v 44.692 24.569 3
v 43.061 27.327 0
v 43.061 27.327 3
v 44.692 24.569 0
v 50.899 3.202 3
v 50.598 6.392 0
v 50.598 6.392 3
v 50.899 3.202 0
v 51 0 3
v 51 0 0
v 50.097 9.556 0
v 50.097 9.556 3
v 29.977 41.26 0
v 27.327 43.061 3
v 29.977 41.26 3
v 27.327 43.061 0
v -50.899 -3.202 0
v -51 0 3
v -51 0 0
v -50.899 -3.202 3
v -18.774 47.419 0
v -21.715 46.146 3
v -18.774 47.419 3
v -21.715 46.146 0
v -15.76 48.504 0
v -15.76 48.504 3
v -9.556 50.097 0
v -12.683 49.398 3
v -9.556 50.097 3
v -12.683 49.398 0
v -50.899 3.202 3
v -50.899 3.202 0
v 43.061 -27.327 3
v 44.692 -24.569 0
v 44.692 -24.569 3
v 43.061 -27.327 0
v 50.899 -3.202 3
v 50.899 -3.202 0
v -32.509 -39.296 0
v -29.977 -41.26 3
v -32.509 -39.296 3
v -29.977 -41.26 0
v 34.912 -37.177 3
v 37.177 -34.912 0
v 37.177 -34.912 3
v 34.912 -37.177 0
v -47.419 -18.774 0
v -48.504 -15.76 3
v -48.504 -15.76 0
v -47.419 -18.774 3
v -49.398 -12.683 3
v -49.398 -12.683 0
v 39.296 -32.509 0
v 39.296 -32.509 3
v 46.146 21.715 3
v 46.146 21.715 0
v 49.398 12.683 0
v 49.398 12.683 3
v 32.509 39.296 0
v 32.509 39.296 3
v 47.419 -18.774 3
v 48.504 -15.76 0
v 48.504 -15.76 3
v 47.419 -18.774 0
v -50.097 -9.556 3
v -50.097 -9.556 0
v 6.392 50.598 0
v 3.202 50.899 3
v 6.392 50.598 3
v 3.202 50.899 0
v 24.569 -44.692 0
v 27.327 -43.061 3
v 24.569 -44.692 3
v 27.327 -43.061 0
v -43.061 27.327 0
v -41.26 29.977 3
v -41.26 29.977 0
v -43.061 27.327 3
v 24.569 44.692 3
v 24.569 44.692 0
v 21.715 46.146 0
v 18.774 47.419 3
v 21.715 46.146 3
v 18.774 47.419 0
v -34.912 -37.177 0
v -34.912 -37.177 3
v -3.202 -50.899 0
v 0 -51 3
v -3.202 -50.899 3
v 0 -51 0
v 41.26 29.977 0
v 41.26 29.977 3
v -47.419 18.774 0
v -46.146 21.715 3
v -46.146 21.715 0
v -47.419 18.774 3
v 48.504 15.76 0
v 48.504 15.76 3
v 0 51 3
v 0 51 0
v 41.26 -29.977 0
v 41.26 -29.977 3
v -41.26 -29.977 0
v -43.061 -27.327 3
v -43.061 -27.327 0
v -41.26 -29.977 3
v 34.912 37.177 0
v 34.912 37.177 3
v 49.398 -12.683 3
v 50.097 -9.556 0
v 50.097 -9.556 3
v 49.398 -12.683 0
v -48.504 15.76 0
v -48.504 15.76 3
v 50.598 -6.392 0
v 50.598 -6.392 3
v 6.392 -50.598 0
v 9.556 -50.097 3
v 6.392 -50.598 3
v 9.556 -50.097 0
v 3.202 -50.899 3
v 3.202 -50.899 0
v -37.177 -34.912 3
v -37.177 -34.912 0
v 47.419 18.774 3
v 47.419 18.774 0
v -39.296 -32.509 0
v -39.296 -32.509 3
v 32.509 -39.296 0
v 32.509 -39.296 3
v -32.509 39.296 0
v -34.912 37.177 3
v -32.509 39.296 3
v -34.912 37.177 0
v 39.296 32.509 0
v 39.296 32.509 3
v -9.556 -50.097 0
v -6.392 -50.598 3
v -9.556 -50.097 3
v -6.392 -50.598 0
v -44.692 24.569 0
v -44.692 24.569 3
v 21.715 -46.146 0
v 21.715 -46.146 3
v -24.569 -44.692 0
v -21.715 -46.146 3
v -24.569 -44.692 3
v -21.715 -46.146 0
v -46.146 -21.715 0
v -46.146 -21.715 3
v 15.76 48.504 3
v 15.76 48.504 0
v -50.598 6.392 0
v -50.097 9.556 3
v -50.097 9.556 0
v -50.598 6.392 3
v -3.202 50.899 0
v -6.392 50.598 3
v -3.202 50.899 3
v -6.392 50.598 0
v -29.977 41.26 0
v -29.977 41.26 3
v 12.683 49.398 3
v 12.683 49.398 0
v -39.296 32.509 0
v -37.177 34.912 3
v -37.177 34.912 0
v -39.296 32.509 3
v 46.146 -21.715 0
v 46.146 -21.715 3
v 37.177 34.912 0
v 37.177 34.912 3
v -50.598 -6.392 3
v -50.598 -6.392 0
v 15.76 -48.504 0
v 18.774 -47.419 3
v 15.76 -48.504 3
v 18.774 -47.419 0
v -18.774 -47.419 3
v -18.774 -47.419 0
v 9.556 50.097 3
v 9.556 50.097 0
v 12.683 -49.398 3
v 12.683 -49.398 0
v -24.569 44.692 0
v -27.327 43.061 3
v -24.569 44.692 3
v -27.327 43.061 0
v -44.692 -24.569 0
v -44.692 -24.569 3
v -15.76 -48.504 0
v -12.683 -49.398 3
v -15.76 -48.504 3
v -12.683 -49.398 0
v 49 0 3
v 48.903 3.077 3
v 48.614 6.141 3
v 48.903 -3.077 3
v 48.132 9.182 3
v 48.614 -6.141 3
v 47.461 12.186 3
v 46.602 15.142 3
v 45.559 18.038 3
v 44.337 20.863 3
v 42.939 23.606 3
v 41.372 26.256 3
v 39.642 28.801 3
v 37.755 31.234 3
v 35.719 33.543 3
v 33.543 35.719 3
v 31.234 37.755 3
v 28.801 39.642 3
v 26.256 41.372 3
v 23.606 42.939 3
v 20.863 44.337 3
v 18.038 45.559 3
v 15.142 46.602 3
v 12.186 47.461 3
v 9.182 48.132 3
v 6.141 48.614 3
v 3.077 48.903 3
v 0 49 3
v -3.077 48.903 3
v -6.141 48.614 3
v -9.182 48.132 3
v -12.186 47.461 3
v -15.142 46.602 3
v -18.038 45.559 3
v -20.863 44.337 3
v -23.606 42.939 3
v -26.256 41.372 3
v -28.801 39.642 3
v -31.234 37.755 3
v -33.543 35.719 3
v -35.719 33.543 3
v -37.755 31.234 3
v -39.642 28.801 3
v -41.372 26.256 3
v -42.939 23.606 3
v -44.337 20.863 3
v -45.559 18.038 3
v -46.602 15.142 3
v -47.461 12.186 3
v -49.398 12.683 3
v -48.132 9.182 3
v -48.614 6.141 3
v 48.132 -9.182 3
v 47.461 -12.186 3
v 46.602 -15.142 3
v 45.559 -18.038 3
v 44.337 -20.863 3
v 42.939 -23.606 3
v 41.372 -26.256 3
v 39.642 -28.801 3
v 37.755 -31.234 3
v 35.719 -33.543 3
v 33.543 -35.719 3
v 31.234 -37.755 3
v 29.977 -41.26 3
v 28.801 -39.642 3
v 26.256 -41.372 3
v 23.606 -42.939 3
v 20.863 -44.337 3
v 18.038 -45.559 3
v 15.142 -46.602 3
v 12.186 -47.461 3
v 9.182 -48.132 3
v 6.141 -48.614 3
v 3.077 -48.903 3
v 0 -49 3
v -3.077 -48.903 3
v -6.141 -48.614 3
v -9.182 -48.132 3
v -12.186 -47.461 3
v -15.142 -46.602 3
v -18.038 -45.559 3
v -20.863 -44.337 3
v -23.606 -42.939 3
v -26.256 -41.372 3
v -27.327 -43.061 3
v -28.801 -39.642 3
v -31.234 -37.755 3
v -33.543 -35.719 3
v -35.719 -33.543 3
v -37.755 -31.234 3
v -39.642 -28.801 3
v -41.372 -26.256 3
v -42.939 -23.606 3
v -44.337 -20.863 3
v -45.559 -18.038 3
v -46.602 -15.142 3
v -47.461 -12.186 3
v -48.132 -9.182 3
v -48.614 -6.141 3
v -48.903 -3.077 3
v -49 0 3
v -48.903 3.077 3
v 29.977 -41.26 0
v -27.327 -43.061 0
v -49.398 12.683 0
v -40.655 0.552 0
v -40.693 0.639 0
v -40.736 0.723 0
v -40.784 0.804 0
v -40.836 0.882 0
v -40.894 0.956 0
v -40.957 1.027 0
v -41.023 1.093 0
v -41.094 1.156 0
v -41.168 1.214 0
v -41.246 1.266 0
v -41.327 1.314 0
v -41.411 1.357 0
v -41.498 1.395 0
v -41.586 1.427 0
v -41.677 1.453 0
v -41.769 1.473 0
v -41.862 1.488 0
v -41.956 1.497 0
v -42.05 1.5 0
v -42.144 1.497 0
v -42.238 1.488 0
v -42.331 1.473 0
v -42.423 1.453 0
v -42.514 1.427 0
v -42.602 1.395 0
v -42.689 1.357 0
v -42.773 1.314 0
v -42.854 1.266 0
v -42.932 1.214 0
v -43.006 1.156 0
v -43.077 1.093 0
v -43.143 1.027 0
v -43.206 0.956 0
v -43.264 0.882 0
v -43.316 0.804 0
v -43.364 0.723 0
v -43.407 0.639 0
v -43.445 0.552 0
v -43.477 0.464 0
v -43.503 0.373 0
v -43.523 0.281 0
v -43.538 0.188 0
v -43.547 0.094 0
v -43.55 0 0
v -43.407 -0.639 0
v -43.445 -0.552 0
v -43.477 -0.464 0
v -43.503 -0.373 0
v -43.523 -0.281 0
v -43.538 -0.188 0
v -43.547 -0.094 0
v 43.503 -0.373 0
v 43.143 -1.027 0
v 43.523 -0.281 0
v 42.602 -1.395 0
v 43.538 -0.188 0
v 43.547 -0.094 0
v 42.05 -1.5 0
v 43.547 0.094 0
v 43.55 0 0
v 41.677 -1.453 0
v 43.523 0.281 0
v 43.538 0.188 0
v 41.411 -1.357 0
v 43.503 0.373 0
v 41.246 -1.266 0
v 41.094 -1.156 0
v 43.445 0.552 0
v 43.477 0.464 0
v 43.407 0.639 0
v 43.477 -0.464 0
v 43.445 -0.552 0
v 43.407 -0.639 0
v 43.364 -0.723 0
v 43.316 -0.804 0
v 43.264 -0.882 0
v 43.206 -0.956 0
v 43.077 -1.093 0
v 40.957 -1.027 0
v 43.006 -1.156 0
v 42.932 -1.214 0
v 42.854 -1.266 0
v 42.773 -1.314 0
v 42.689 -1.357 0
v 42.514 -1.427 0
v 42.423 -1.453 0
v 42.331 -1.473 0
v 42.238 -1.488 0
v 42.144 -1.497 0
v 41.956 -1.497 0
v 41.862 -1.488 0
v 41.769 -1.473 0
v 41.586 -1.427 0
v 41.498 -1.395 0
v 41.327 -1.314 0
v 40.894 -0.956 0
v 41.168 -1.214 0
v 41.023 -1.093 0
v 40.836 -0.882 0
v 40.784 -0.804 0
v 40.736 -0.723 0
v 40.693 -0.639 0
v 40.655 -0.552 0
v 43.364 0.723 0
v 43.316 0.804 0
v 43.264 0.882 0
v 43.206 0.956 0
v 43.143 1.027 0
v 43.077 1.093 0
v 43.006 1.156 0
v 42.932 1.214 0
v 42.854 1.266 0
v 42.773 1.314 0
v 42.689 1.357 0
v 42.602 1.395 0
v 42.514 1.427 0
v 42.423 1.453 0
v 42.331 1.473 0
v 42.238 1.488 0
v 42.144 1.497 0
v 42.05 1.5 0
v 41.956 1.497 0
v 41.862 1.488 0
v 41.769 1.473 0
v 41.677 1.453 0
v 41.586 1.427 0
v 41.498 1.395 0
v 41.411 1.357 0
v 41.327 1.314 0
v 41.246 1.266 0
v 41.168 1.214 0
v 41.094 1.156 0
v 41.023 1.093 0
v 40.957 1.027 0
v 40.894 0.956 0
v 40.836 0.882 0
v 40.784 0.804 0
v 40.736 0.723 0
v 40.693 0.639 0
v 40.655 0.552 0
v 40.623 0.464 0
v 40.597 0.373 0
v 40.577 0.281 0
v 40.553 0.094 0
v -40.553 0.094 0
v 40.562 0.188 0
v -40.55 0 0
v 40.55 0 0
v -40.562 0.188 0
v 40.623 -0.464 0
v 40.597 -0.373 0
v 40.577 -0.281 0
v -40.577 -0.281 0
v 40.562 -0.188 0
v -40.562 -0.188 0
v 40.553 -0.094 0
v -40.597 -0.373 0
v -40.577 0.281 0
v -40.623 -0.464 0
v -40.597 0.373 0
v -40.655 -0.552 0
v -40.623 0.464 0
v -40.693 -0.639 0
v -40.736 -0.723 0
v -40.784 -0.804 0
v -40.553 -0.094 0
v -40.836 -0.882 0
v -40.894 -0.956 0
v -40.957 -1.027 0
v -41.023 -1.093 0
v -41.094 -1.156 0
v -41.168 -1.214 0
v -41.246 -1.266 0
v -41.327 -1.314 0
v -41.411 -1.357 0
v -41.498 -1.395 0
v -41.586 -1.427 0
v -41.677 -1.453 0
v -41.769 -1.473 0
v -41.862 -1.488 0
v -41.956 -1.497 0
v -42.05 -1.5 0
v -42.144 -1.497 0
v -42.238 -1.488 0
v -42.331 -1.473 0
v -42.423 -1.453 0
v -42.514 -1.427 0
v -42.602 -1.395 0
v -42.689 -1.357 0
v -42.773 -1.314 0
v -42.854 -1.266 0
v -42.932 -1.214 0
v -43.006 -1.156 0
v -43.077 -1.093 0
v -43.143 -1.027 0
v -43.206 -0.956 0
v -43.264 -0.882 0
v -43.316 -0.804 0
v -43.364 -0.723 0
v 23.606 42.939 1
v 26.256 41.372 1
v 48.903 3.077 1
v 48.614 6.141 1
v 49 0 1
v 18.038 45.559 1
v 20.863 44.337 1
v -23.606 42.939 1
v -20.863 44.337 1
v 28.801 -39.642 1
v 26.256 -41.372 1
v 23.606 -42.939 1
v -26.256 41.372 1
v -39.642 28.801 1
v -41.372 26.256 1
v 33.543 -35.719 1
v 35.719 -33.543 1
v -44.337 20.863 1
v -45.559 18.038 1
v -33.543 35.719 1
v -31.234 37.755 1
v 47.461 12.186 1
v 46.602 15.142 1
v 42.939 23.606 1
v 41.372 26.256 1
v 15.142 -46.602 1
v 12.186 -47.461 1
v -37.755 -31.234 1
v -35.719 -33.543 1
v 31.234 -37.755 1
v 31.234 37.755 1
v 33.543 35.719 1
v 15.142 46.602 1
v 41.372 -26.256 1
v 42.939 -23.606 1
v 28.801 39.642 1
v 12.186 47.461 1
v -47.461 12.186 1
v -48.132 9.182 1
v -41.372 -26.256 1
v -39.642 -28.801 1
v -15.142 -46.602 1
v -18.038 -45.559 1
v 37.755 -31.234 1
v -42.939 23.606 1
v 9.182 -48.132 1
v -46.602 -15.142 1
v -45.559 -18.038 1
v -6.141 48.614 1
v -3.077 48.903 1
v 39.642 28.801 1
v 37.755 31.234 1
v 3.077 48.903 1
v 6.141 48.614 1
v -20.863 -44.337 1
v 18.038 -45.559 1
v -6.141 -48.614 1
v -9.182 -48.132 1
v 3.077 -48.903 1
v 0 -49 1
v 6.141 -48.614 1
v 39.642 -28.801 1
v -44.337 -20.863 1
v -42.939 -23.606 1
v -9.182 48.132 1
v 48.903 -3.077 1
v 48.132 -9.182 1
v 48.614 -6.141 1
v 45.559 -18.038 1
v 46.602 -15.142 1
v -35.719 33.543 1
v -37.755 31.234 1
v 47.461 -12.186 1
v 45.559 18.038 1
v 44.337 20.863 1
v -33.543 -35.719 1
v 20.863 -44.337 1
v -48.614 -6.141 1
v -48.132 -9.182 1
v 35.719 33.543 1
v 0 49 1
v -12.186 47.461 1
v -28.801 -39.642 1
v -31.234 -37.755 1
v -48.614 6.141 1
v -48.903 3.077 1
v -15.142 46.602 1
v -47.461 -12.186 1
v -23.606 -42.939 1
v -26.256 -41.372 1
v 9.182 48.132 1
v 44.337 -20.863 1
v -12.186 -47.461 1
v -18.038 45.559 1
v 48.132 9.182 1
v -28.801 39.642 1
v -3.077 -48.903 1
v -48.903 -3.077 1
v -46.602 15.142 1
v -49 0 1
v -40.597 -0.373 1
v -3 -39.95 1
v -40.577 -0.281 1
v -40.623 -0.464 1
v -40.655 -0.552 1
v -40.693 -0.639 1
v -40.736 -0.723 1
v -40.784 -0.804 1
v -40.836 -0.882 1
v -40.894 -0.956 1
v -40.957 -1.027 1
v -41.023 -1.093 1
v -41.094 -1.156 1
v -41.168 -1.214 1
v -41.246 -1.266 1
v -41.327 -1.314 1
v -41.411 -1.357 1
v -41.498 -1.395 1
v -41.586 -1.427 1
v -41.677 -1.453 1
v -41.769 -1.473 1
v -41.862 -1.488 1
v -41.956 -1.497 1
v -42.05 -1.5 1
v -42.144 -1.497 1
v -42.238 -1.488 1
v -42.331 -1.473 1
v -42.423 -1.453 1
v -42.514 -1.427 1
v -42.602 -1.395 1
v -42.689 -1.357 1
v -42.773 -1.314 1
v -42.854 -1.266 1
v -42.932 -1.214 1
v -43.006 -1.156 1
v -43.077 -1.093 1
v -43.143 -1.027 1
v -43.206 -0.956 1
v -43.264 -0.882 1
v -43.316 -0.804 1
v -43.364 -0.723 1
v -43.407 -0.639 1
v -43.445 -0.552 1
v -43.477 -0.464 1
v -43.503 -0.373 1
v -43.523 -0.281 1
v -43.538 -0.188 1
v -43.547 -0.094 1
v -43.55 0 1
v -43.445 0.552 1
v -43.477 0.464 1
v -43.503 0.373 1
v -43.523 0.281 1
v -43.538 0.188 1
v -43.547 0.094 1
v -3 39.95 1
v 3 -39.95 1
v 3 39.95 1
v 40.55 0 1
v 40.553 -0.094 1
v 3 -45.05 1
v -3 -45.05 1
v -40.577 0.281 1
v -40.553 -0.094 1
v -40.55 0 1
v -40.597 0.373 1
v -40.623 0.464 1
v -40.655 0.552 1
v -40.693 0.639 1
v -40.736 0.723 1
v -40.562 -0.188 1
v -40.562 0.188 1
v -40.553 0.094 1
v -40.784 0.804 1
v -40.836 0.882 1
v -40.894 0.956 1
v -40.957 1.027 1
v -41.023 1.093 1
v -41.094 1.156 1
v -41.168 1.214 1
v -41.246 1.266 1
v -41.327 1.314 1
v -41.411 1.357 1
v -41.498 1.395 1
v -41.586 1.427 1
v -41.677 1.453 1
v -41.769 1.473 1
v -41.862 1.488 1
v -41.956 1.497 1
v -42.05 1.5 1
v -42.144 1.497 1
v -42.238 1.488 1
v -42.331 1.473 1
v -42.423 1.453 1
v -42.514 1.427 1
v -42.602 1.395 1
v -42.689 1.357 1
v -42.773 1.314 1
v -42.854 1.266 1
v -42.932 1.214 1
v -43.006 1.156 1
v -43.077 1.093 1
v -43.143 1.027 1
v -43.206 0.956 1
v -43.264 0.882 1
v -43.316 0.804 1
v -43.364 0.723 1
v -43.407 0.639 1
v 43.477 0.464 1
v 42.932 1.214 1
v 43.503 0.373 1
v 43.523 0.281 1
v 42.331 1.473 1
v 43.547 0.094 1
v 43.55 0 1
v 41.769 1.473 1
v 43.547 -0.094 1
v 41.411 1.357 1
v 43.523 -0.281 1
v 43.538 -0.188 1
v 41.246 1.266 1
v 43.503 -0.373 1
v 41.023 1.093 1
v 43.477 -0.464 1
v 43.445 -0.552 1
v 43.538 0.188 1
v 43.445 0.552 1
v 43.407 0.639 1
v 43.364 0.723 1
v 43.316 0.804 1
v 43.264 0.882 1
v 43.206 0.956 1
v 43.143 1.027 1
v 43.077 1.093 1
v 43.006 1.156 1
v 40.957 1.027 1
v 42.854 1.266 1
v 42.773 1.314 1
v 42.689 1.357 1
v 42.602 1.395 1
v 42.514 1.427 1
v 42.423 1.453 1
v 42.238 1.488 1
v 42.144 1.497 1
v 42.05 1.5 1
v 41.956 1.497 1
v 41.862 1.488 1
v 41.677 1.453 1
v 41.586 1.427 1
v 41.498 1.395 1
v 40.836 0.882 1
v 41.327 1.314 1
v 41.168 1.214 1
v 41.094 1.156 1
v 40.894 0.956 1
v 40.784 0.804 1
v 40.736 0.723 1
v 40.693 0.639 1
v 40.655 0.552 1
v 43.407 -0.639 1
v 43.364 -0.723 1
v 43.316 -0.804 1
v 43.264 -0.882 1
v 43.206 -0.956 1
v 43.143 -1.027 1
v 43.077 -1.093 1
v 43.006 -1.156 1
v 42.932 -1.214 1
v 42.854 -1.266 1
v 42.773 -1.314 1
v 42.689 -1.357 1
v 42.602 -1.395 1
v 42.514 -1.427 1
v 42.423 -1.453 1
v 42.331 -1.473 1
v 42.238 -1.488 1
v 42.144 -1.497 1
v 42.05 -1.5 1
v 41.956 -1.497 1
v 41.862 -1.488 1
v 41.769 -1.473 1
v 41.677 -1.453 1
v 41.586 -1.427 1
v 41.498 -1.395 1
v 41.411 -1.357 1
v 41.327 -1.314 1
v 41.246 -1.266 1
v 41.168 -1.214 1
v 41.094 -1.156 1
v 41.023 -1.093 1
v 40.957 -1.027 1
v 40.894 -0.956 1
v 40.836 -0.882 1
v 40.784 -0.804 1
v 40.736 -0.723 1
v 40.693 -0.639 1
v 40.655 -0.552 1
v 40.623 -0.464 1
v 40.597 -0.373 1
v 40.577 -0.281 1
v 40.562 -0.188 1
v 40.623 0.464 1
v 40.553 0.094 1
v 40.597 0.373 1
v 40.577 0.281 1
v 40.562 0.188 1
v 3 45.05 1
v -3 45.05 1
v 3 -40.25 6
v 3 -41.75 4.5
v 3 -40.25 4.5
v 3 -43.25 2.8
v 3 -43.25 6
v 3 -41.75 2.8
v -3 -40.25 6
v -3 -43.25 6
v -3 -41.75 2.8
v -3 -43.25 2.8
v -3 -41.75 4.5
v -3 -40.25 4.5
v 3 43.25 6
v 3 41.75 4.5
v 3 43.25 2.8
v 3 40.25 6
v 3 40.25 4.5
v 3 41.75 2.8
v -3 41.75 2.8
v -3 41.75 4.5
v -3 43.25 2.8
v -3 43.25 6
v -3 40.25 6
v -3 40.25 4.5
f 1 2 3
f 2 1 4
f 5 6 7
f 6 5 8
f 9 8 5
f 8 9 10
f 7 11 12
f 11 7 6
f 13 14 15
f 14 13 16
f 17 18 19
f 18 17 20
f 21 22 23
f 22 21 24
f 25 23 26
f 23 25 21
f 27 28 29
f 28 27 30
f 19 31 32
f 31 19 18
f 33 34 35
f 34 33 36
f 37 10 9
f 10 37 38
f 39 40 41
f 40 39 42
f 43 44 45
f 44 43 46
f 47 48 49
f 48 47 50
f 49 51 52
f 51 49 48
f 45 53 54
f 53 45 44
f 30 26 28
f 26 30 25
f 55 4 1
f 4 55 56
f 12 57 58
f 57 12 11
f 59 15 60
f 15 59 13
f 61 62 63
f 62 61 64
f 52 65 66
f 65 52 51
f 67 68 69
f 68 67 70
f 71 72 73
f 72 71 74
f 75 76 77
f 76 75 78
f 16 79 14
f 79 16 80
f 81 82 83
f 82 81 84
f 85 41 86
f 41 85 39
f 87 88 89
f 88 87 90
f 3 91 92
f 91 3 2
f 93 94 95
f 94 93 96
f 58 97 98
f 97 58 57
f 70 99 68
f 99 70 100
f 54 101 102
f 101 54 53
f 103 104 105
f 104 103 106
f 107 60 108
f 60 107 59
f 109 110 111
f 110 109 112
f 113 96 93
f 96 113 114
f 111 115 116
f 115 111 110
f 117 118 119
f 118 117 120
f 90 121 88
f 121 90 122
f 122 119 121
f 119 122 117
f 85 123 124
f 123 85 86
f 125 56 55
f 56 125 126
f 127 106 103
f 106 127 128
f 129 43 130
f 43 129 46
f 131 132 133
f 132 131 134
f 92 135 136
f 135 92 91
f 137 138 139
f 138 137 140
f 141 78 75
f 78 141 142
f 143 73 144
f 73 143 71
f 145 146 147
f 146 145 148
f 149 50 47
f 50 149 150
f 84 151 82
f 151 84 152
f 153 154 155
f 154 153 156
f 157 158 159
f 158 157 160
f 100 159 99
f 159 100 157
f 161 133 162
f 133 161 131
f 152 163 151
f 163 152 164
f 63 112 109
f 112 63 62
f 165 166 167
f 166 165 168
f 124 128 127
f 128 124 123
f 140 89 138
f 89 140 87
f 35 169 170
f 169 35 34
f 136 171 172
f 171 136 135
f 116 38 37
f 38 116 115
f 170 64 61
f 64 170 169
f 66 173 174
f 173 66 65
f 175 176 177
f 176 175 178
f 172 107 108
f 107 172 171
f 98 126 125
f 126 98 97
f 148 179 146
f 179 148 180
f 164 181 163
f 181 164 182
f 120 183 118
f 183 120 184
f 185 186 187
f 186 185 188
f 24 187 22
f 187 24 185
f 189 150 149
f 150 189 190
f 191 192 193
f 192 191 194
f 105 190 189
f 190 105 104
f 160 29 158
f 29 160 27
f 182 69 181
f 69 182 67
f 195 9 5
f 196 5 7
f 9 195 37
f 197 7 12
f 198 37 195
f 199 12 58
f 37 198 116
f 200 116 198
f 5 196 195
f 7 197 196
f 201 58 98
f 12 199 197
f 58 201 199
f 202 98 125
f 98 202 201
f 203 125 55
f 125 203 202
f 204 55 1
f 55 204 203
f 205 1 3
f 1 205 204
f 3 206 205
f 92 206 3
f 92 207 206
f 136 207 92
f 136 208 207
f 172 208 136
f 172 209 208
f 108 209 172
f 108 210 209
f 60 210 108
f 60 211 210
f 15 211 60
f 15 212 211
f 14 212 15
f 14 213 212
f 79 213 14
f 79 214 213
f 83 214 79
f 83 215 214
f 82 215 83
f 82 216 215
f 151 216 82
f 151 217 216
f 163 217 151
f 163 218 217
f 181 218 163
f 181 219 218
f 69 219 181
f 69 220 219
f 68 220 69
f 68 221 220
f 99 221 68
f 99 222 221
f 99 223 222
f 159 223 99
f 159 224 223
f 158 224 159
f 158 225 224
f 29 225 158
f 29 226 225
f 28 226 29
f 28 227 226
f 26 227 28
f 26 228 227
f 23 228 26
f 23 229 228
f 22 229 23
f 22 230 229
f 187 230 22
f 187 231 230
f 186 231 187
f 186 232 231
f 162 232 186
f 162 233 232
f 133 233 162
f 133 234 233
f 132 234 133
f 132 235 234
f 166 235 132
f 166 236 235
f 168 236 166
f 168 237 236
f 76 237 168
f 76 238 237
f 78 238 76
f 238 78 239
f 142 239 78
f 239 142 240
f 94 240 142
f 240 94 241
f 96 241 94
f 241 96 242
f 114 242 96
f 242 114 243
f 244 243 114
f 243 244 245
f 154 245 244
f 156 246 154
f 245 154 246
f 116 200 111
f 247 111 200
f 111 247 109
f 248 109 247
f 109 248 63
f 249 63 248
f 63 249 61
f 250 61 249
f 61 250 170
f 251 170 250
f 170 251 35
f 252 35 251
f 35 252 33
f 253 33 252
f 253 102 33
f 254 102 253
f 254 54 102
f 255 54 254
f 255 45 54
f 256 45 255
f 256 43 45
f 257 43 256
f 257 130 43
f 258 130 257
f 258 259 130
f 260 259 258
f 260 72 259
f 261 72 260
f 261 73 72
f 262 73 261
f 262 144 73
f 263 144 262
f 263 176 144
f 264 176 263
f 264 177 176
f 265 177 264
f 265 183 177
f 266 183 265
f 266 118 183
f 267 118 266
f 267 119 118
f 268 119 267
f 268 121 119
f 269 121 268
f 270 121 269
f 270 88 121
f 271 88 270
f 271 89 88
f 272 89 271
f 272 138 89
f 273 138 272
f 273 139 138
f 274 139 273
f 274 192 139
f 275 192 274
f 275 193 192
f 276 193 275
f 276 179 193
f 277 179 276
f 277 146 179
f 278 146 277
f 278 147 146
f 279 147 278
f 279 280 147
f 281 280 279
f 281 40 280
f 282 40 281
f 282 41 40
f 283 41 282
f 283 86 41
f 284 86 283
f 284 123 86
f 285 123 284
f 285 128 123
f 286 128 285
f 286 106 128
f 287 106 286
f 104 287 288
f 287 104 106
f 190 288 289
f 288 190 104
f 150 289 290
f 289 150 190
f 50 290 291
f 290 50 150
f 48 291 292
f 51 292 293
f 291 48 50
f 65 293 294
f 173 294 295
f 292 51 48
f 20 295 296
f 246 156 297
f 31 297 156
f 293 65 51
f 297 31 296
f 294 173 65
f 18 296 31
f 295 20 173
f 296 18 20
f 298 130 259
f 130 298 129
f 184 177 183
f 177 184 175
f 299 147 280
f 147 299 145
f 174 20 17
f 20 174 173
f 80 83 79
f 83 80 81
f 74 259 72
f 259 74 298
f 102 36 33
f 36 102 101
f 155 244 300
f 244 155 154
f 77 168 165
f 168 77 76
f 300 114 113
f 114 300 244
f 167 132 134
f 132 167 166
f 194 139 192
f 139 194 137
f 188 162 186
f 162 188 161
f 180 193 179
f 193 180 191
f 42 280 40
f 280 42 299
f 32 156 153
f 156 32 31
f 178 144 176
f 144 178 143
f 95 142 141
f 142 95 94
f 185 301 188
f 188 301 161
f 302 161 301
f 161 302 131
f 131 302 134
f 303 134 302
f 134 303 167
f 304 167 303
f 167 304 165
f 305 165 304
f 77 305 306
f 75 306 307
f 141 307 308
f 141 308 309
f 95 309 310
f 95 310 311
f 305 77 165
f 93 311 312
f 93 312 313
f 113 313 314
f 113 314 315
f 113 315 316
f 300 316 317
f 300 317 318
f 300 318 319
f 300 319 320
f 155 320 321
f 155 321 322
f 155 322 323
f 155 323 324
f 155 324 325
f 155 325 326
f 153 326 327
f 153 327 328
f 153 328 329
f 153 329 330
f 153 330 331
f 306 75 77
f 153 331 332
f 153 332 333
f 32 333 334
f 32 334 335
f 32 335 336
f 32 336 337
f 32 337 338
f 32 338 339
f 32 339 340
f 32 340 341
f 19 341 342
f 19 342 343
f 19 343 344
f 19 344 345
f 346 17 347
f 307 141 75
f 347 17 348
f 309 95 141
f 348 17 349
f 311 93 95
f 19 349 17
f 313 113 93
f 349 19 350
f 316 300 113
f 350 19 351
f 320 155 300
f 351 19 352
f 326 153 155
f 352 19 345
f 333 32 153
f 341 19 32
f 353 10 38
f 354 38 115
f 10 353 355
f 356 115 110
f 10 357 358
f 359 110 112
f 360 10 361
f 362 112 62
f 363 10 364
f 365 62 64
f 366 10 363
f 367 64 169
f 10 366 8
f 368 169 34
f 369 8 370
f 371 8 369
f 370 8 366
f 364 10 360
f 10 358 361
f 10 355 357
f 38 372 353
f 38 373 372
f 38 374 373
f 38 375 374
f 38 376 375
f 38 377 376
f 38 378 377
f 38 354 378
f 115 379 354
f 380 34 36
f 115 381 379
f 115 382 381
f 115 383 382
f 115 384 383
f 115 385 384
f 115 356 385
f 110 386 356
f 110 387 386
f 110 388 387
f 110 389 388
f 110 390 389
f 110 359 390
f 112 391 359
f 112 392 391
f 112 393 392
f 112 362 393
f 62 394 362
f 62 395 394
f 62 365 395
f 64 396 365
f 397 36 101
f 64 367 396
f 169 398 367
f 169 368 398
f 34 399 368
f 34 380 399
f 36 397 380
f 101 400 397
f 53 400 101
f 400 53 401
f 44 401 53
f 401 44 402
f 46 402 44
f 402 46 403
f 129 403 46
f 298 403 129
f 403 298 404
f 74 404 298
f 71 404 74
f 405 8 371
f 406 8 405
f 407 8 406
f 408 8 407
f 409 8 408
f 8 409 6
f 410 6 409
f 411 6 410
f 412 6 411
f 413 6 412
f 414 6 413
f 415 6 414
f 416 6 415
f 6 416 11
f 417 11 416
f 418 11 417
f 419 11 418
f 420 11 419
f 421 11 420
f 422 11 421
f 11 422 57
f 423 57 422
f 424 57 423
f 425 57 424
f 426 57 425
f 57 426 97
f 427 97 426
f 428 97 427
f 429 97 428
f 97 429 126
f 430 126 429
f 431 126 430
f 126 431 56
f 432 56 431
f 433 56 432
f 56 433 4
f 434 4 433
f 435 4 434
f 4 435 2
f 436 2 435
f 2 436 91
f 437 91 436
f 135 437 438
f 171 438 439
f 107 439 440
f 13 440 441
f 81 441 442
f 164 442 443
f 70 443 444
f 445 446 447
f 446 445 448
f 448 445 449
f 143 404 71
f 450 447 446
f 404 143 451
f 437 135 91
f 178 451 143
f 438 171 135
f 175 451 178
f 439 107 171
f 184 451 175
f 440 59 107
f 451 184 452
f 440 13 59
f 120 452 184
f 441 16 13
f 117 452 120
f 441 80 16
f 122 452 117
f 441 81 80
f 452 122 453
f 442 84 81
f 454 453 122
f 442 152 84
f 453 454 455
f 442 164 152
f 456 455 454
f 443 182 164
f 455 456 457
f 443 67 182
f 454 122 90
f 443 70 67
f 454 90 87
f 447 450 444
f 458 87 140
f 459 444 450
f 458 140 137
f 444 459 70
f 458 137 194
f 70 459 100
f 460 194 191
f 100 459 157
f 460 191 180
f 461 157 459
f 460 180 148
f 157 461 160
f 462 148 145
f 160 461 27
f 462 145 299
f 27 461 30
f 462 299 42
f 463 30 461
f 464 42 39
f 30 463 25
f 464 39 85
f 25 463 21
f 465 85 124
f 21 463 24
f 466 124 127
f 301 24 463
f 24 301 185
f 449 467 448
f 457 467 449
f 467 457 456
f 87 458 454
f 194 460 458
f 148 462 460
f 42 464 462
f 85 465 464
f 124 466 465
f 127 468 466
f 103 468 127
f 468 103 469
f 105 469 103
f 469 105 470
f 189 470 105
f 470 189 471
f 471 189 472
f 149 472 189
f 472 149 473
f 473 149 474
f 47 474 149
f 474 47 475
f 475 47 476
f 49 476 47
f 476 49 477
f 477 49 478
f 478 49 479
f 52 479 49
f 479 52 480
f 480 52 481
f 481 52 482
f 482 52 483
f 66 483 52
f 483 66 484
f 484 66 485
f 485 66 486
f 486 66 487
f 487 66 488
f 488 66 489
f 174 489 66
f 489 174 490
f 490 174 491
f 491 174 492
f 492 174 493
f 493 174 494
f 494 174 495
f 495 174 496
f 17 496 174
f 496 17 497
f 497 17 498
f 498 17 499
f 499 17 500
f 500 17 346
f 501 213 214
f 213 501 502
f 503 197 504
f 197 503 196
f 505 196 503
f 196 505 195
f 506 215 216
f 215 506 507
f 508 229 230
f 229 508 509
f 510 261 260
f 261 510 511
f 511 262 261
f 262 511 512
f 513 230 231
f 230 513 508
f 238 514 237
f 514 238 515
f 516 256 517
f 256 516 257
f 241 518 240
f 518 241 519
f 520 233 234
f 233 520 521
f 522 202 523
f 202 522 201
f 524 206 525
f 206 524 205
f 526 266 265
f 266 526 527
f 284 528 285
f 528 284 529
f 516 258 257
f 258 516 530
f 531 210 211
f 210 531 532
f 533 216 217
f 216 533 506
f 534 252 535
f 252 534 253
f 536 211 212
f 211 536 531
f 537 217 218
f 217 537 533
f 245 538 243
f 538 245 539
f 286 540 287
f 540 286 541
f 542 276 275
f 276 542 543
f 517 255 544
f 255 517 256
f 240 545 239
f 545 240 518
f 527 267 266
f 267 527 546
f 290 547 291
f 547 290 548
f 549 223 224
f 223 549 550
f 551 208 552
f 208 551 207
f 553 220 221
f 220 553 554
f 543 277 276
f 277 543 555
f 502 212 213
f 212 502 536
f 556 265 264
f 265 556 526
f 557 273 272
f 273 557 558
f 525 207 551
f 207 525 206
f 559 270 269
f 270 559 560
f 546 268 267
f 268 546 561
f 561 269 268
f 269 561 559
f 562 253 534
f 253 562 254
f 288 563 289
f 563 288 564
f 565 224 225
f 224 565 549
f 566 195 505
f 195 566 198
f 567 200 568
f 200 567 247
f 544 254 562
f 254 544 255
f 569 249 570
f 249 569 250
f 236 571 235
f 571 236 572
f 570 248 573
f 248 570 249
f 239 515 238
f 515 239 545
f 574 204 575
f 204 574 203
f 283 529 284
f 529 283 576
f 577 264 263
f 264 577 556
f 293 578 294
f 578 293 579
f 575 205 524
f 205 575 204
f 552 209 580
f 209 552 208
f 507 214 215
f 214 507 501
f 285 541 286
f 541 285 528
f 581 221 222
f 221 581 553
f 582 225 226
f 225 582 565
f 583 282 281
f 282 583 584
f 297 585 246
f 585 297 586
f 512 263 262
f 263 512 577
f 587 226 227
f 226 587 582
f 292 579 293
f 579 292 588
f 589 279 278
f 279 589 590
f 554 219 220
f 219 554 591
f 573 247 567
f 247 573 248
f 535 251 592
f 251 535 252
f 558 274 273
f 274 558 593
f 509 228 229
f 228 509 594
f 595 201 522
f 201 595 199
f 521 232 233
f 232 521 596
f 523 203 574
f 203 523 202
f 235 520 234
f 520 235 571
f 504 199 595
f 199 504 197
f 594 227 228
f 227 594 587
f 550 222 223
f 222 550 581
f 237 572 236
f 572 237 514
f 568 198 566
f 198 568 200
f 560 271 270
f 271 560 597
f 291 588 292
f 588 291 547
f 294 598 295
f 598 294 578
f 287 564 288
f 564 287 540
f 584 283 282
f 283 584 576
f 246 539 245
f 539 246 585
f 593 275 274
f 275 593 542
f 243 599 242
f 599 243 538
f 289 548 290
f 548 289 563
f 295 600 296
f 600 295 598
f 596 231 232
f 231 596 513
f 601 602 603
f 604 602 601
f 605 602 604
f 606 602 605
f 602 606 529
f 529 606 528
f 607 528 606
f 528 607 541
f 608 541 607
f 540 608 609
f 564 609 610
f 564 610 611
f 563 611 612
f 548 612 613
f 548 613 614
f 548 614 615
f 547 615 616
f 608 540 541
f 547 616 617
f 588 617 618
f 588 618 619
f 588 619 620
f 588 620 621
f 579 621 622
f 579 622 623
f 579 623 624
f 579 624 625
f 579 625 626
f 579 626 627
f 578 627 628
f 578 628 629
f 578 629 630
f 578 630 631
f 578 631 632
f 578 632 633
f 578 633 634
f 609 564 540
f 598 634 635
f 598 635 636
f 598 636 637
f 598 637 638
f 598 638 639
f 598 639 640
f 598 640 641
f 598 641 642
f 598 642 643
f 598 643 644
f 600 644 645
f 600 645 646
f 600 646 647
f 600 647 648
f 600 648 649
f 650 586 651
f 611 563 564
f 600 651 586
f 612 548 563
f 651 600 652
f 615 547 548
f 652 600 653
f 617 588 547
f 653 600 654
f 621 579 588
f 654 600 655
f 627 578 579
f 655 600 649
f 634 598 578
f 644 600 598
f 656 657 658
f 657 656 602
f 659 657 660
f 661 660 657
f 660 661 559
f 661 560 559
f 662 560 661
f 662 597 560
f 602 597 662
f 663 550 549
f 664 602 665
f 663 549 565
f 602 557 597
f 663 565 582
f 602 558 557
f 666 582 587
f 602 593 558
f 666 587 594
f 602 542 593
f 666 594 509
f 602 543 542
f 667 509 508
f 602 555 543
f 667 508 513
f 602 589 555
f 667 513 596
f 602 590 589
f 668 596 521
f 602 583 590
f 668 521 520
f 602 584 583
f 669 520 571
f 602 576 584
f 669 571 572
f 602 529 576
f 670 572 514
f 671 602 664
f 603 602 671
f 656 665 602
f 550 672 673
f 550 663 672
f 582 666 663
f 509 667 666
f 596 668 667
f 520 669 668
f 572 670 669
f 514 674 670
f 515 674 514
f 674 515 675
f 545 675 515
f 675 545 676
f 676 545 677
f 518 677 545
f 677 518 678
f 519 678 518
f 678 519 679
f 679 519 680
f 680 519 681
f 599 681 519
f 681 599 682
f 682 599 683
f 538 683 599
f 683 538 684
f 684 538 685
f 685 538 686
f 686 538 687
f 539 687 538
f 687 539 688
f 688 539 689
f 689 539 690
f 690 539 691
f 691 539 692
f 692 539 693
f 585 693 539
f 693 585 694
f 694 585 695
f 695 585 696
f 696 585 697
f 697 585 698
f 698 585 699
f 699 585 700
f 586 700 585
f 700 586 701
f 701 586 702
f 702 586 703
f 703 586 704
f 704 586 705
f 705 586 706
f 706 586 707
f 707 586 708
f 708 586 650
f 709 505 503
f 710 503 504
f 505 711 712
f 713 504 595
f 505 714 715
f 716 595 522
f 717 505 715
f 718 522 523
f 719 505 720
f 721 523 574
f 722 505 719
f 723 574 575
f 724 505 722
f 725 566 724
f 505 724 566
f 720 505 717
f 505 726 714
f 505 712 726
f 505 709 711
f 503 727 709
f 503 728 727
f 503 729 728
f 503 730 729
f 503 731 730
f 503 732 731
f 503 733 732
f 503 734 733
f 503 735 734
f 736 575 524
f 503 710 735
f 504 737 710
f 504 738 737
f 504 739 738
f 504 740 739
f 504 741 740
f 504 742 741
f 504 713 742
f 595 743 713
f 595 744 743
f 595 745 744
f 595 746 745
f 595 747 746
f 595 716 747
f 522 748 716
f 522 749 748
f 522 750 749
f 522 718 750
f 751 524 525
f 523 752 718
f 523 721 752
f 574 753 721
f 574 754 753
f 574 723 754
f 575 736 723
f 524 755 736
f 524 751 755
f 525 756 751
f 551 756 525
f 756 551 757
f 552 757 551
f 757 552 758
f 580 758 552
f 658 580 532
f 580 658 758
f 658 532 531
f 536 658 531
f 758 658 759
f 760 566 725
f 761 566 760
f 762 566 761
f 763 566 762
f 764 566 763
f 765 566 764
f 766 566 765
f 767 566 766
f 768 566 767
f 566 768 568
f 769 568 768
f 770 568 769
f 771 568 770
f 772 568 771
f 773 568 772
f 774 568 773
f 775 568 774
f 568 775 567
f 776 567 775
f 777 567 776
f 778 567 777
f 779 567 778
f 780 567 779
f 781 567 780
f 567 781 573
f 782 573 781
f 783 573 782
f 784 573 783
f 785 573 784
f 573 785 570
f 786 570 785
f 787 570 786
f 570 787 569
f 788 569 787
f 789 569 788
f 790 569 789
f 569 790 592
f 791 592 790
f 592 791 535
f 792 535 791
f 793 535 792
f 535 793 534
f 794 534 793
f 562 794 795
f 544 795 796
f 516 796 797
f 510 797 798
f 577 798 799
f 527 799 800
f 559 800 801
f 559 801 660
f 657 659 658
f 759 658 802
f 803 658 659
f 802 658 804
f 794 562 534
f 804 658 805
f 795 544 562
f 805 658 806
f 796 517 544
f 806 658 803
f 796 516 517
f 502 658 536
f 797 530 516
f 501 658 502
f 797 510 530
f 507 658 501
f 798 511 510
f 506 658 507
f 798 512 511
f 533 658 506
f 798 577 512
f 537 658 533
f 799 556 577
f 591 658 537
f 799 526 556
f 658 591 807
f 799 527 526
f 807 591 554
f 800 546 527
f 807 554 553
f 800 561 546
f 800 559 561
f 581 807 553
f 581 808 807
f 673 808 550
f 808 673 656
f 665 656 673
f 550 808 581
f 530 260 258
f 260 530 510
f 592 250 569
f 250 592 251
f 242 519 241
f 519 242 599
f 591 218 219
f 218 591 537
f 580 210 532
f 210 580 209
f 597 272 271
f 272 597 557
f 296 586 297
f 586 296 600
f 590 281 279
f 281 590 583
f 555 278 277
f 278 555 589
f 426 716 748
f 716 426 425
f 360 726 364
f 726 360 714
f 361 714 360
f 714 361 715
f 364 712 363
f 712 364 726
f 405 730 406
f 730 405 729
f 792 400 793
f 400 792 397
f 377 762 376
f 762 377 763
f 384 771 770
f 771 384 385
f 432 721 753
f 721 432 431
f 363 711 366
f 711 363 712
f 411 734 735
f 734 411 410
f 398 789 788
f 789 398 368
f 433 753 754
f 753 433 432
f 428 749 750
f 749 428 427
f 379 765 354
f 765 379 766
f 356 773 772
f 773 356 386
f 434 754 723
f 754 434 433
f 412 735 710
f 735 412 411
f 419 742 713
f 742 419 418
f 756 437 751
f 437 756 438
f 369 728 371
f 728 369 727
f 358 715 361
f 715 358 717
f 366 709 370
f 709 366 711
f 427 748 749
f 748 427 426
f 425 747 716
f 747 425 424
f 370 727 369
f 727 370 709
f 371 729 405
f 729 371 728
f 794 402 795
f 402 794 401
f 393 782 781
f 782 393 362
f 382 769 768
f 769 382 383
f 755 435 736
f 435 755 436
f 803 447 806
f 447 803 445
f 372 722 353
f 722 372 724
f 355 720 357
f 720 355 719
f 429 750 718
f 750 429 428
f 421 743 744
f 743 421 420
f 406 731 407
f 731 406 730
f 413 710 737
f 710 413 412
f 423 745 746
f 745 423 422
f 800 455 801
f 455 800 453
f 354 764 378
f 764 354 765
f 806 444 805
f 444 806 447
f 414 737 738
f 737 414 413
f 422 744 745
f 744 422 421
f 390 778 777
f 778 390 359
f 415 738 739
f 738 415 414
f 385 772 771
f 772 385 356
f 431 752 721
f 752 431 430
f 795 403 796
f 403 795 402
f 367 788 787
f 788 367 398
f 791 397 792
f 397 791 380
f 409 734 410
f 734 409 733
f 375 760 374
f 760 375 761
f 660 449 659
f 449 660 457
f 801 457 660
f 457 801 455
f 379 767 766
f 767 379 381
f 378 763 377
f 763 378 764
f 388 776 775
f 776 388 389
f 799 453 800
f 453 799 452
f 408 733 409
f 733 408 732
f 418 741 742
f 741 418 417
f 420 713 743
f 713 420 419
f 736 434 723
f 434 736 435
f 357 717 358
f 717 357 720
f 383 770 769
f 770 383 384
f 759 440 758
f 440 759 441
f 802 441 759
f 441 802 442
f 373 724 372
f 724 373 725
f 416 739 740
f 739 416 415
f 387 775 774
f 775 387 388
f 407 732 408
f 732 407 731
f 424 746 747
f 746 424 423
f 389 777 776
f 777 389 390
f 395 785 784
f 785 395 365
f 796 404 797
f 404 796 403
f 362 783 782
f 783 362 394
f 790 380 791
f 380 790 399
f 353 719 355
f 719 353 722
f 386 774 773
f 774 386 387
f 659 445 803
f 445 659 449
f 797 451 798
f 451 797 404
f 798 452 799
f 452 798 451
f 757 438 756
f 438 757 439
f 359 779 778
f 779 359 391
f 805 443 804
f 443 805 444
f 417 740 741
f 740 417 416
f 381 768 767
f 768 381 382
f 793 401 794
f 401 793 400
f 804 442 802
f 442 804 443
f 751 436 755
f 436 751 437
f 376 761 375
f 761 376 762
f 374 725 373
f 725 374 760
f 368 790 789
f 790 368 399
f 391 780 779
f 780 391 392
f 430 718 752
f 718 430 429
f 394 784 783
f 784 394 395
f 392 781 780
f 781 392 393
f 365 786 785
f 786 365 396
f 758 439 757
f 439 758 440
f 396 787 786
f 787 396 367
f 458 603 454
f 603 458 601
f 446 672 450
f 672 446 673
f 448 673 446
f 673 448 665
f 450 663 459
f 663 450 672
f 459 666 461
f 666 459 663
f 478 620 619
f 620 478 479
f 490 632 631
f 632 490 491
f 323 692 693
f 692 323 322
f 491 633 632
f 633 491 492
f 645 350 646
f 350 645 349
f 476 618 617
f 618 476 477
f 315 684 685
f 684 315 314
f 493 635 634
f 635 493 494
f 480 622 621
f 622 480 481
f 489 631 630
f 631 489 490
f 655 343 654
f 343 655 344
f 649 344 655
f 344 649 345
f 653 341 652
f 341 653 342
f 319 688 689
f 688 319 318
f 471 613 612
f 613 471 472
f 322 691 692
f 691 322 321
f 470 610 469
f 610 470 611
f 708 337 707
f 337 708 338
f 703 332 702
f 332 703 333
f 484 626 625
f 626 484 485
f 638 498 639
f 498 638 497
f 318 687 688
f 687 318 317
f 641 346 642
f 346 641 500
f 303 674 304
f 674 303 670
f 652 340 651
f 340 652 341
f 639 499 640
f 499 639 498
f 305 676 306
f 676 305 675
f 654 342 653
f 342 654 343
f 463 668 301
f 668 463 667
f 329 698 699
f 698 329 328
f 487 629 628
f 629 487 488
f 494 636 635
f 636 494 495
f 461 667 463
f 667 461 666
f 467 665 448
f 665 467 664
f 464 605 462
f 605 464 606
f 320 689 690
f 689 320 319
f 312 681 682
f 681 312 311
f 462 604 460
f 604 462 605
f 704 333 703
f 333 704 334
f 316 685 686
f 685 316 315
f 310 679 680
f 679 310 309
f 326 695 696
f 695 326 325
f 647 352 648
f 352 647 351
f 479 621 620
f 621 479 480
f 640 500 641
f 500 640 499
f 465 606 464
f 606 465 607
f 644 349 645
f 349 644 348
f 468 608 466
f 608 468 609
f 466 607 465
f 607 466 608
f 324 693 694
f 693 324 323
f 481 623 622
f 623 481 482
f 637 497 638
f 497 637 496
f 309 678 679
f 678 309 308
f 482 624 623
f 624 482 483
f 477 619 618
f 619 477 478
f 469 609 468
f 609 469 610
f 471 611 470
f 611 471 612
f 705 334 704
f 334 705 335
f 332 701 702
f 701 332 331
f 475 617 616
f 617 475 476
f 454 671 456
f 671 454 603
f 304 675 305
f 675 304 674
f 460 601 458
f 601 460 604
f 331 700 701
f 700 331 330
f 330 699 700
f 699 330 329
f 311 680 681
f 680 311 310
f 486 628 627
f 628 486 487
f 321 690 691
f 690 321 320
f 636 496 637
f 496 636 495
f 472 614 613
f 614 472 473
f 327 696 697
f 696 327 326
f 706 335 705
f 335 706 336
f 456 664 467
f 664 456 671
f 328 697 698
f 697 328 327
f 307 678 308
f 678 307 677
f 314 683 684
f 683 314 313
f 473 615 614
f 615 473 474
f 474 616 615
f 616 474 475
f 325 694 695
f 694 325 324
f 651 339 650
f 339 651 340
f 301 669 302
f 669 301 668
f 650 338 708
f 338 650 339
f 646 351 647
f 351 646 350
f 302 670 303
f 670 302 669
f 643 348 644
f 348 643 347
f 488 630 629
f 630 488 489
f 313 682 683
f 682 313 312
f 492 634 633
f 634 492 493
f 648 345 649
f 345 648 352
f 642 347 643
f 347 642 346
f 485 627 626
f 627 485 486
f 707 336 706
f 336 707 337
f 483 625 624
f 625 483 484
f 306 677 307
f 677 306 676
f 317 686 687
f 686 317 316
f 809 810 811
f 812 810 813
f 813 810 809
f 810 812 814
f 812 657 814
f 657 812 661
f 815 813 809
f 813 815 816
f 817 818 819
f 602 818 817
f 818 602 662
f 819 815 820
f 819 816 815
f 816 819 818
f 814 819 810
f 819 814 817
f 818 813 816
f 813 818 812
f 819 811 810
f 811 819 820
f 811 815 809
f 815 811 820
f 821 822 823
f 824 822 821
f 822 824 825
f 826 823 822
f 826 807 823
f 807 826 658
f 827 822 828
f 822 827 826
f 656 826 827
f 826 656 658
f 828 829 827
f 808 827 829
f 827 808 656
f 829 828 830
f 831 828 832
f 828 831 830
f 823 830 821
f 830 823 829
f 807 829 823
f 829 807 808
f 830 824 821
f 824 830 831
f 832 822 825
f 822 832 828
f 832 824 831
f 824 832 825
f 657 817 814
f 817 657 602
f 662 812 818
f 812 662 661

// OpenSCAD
$fn = 100;

plate_thiknes = 1;
rim_height = 2;
screw_hole_width = 3;
screw_hole_distance = 84.10;
width = 98;
clip_distance = 86.5;
clip_height = 5;
clip_width = 1.5;
clip_depth = 6;
clip_socket_depth = 2.8;
latch_height = 1.5;
latch_width = 1.5;

module prism(l, w, h) {
    polyhedron(//pt 0        1        2        3        4        5
        points=[[0,0,0], [l,0,0], [l,w,0], [0,w,0], [0,w,h], [l,w,h]],
        faces=[[0,1,2,3],[5,4,3,2],[0,4,5,1],[0,3,4],[5,2,1]]);
}

module clip() {
    union() {
        translate([-(clip_depth/2), ((clip_distance)/2)-clip_width-clip_socket_depth, 0]) {
            prism(clip_depth, clip_socket_depth, clip_socket_depth);
        }
        translate([(clip_depth/2), ((clip_distance)/2)+2.8, 0]) {
            rotate([0,0,180]) {
                prism(clip_depth, clip_socket_depth, clip_socket_depth);
            }
        }
        translate([0, -((clip_distance-clip_width)/2), clip_height/2 + plate_thiknes]) {
            union() {

                cube([clip_depth, clip_width, clip_height], true);
                translate([0, latch_width, (clip_height-latch_height)/2]) {
                    cube([clip_depth, latch_width, latch_height], true);
                }
            } 
        }
    }
}

union() {
    difference() {
        cylinder(plate_thiknes + rim_height, width/2 + rim_height, width/2 + rim_height);
        translate([0, 0, plate_thiknes]) {
            cylinder(100, width/2, width/2);
        }
        translate([screw_hole_distance/2, 0, -2]) {
            cylinder(100, screw_hole_width/2,screw_hole_width/2);
        }
        translate([-screw_hole_distance/2, 0, -2]) {
            cylinder(100, screw_hole_width/2,screw_hole_width/2);
        }
    }

    clip();
    rotate([0, 0, 180]) {
        clip();
    }
}
